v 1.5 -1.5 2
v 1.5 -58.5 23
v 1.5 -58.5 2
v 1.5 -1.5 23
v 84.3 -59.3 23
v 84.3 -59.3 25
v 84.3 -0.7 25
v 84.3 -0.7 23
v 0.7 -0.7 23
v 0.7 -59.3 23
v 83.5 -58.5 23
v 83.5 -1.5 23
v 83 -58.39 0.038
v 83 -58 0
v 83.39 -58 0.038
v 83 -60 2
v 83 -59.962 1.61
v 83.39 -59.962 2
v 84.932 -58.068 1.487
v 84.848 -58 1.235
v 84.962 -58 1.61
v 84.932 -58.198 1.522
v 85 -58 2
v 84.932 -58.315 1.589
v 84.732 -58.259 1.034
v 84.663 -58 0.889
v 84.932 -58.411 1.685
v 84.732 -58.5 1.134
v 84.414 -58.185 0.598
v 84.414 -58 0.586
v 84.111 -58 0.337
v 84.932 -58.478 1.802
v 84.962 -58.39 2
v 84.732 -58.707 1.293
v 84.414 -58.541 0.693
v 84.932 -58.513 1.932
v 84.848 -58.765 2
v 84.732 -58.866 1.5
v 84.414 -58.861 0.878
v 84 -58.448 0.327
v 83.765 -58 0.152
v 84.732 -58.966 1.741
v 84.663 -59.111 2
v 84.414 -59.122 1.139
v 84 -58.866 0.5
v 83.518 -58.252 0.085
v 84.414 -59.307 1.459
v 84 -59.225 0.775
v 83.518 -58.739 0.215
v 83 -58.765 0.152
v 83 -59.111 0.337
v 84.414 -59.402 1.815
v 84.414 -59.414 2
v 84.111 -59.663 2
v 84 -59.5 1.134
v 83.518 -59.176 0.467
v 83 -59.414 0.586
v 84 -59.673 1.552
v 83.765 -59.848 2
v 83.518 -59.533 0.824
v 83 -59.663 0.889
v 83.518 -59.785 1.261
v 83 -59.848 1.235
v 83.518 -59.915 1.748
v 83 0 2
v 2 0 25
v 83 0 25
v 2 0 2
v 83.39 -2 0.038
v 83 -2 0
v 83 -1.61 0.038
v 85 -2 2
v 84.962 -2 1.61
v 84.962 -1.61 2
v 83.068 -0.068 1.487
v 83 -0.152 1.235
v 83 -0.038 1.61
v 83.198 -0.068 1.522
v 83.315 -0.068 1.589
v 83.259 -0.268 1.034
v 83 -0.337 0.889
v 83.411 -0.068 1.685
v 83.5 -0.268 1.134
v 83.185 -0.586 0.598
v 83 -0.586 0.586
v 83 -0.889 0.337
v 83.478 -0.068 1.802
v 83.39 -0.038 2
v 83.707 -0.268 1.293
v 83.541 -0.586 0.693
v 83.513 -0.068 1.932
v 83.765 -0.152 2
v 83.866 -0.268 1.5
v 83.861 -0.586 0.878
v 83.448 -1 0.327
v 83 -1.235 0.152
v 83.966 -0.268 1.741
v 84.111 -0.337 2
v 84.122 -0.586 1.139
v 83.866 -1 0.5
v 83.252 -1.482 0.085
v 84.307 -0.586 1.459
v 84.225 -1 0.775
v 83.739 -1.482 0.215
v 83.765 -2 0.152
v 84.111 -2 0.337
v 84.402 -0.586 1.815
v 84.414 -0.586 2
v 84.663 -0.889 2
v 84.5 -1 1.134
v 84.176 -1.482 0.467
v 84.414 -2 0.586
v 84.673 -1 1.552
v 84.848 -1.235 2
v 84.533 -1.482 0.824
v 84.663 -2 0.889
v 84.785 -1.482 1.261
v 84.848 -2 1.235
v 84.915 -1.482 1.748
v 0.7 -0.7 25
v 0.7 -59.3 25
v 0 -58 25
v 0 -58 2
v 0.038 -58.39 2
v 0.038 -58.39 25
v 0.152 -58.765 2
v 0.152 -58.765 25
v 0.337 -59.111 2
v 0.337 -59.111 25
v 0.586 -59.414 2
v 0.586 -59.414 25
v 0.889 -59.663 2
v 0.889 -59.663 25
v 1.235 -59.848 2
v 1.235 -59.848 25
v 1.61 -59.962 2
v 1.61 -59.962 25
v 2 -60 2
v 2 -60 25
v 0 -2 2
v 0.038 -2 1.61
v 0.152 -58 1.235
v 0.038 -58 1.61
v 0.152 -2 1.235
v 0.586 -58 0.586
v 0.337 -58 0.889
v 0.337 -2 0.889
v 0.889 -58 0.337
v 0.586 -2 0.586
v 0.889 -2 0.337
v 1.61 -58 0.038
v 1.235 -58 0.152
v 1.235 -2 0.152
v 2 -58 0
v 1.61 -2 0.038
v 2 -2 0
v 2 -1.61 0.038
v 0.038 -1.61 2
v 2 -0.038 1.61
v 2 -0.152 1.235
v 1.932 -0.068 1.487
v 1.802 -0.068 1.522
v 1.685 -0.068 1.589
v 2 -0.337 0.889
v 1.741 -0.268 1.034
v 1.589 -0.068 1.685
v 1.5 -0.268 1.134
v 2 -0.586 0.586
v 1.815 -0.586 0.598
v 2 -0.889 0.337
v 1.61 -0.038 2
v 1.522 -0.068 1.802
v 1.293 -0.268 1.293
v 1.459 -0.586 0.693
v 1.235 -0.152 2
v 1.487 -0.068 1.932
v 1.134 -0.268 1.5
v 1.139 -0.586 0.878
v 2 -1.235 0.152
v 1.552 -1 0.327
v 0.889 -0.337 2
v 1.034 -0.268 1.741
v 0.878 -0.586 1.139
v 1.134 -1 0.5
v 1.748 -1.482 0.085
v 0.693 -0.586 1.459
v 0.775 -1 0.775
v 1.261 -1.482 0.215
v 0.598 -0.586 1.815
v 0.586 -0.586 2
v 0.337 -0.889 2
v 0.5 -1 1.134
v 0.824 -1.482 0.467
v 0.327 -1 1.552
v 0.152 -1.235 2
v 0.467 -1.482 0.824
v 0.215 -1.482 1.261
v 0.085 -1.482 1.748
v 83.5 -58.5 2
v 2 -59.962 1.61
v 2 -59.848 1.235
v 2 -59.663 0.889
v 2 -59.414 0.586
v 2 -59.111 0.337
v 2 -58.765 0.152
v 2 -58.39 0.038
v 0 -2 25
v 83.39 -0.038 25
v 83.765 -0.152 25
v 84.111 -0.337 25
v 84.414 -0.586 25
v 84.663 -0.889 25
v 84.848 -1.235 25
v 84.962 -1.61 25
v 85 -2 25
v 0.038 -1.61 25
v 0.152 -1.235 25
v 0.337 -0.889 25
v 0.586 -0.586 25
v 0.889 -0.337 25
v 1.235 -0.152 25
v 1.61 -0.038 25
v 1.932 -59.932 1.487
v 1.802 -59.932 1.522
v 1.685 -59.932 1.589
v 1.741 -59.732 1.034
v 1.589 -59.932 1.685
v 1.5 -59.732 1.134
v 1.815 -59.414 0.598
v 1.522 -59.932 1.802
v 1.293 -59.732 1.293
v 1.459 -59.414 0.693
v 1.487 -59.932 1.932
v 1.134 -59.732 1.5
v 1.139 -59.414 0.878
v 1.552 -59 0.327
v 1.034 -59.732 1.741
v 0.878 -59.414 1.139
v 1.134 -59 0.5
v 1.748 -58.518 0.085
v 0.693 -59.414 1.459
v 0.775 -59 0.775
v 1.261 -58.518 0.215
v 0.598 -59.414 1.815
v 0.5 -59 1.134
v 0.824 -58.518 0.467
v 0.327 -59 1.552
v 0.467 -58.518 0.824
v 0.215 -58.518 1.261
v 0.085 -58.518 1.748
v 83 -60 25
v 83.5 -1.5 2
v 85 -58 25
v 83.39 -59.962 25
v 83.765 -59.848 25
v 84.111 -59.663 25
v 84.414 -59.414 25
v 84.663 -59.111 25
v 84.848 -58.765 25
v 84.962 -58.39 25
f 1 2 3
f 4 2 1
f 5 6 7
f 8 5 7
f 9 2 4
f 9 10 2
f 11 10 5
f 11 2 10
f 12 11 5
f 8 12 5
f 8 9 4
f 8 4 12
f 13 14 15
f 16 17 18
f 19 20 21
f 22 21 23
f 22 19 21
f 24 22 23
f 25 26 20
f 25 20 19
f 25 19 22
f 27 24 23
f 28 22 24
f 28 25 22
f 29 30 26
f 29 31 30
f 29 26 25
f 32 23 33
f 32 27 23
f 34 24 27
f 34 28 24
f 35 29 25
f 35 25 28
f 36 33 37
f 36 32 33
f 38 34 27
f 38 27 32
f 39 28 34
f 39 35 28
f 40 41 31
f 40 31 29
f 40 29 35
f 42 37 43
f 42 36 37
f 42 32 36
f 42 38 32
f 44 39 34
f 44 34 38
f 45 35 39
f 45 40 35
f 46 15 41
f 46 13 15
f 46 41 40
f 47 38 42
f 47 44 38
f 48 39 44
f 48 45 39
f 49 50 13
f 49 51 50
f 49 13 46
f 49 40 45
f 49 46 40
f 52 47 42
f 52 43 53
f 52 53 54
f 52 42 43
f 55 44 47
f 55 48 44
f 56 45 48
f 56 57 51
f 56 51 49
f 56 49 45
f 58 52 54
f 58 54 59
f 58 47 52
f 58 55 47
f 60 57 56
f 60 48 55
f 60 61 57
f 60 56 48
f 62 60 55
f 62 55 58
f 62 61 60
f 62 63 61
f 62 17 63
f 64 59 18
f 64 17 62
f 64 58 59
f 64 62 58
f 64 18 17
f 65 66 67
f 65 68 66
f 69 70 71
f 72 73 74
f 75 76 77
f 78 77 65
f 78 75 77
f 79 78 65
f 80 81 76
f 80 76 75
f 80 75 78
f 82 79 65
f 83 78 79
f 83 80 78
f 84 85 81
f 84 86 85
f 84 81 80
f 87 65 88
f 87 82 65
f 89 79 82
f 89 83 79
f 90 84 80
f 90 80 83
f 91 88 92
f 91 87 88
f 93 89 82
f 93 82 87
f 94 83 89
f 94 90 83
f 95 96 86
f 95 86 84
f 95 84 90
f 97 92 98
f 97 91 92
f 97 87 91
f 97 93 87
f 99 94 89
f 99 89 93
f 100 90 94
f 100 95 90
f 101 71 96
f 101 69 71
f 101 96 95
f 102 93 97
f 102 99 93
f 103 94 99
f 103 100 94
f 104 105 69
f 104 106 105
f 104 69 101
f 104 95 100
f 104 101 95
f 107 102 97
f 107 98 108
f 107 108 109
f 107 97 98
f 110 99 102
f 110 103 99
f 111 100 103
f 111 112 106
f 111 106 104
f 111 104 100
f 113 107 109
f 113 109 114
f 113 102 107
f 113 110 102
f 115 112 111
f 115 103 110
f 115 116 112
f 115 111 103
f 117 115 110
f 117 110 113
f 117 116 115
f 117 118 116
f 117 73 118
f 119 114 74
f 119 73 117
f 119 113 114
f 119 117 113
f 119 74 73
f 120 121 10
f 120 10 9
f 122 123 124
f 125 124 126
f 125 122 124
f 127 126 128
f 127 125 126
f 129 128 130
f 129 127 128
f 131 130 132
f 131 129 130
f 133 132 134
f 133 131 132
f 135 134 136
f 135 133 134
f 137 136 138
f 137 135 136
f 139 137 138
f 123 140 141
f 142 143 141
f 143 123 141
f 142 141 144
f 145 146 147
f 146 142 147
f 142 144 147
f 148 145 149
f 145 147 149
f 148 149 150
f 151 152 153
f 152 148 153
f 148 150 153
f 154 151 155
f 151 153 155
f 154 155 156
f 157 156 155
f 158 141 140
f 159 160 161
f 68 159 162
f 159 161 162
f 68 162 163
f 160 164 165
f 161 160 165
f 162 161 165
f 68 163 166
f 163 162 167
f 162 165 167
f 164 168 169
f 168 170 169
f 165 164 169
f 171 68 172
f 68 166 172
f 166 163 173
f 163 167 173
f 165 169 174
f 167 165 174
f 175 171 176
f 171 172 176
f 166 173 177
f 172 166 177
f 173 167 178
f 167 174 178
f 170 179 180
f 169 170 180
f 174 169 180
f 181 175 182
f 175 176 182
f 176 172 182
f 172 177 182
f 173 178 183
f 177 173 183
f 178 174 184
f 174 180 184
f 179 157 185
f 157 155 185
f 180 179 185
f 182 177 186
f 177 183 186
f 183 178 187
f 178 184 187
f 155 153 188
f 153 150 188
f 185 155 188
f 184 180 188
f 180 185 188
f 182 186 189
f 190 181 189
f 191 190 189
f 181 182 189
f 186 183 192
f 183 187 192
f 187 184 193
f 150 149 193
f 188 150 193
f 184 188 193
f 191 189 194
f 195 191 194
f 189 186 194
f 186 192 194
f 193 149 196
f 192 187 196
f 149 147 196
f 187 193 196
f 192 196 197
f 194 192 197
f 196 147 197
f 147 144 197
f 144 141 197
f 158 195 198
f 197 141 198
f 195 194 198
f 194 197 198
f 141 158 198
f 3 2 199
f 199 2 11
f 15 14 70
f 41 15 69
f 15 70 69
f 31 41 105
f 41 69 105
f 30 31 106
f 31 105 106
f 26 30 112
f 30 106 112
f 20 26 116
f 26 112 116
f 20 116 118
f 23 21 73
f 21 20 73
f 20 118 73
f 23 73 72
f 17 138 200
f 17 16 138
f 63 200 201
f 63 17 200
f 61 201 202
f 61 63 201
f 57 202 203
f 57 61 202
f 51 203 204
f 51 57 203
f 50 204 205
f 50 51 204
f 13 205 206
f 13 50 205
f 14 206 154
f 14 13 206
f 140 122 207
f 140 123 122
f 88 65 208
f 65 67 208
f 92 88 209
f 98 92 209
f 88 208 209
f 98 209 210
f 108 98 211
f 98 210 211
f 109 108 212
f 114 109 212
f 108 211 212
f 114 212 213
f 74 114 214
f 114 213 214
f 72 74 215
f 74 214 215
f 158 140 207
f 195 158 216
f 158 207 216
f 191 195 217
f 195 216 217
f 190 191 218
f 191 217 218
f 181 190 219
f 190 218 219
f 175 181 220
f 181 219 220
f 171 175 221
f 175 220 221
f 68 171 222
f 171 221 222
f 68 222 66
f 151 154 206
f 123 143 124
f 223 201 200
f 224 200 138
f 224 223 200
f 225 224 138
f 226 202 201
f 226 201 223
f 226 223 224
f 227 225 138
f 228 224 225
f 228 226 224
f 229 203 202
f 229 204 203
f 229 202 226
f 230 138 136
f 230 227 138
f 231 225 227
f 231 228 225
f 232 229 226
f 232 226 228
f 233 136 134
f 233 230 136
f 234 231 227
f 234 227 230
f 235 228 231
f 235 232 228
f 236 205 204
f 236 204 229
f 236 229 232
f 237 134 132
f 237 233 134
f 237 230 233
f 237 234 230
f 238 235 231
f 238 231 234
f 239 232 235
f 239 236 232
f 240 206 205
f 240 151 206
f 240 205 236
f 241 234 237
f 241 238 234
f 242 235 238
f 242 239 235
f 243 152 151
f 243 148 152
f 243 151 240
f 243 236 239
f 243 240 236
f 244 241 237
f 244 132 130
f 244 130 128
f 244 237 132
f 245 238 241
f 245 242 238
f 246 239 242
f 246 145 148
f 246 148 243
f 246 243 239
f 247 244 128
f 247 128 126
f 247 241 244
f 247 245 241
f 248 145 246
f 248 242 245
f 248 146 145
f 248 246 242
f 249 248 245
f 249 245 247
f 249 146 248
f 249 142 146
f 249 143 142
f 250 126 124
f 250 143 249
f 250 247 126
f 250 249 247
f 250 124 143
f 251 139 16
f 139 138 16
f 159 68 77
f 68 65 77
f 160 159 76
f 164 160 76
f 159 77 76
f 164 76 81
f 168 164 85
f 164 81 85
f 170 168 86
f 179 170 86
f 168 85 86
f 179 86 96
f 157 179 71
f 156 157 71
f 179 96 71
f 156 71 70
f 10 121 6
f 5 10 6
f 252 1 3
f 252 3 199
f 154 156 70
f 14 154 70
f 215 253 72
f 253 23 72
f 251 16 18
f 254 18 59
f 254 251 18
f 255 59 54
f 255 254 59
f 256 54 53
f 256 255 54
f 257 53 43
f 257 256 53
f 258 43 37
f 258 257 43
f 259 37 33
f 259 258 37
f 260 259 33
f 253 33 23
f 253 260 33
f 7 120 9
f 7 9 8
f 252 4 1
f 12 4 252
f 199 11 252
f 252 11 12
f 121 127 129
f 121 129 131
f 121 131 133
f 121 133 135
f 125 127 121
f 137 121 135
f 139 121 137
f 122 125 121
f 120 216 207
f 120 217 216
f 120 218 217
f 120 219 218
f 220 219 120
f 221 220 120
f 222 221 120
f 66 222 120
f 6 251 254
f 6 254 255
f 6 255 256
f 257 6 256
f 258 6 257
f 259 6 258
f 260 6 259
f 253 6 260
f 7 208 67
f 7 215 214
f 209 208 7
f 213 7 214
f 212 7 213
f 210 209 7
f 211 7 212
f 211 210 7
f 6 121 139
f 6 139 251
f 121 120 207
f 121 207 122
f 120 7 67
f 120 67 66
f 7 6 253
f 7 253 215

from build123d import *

# Parameters (mm, degrees)
SKETCH_1_W          = 85
SKETCH_1_H          = 60
EXTRUDE_1_DEPTH     = 25
SKETCH_2_W          = 82
SKETCH_2_H          = 57
CUT_EXTRUDE_1_DEPTH = 23
SKETCH_3_W          = 83.6
SKETCH_3_H          = 58.6
CUT_EXTRUDE_2_DEPTH = 2
FILLET_1_R          = 2


with BuildPart() as part:
    # 草图1 → 凸台-拉伸1 (new body)
    with BuildSketch(Plane.XY):
        with Locations((42.5, -30)):
            Rectangle(SKETCH_1_W, SKETCH_1_H)
    extrude(amount=EXTRUDE_1_DEPTH)

    # 草图2 → 切除-拉伸1 (cut)
    with BuildSketch(Plane.XY.offset(25)):
        with Locations((42.5, -30)):
            Rectangle(SKETCH_2_W, SKETCH_2_H)
    extrude(amount=-CUT_EXTRUDE_1_DEPTH, mode=Mode.SUBTRACT)

    # 草图3 → 切除-拉伸2 (cut)
    with BuildSketch(Plane.XY.offset(25)):
        with Locations((42.5, -30)):
            Rectangle(SKETCH_3_W, SKETCH_3_H)
    extrude(amount=-CUT_EXTRUDE_2_DEPTH, mode=Mode.SUBTRACT)

    # 圆角1
    fillet_1_edges = [part.edges().sort_by_distance(p)[0] for p in [
        (0, -30, 0),
        (42.5, -60, 0),
        (85, -30, 0),
        (42.5, 0, 0),
        (0, 0, 12.5),
        (0, -60, 12.5),
        (85, -60, 12.5),
        (85, 0, 12.5),
    ]]
    fillet(fillet_1_edges, radius=FILLET_1_R)


solid = part.part
